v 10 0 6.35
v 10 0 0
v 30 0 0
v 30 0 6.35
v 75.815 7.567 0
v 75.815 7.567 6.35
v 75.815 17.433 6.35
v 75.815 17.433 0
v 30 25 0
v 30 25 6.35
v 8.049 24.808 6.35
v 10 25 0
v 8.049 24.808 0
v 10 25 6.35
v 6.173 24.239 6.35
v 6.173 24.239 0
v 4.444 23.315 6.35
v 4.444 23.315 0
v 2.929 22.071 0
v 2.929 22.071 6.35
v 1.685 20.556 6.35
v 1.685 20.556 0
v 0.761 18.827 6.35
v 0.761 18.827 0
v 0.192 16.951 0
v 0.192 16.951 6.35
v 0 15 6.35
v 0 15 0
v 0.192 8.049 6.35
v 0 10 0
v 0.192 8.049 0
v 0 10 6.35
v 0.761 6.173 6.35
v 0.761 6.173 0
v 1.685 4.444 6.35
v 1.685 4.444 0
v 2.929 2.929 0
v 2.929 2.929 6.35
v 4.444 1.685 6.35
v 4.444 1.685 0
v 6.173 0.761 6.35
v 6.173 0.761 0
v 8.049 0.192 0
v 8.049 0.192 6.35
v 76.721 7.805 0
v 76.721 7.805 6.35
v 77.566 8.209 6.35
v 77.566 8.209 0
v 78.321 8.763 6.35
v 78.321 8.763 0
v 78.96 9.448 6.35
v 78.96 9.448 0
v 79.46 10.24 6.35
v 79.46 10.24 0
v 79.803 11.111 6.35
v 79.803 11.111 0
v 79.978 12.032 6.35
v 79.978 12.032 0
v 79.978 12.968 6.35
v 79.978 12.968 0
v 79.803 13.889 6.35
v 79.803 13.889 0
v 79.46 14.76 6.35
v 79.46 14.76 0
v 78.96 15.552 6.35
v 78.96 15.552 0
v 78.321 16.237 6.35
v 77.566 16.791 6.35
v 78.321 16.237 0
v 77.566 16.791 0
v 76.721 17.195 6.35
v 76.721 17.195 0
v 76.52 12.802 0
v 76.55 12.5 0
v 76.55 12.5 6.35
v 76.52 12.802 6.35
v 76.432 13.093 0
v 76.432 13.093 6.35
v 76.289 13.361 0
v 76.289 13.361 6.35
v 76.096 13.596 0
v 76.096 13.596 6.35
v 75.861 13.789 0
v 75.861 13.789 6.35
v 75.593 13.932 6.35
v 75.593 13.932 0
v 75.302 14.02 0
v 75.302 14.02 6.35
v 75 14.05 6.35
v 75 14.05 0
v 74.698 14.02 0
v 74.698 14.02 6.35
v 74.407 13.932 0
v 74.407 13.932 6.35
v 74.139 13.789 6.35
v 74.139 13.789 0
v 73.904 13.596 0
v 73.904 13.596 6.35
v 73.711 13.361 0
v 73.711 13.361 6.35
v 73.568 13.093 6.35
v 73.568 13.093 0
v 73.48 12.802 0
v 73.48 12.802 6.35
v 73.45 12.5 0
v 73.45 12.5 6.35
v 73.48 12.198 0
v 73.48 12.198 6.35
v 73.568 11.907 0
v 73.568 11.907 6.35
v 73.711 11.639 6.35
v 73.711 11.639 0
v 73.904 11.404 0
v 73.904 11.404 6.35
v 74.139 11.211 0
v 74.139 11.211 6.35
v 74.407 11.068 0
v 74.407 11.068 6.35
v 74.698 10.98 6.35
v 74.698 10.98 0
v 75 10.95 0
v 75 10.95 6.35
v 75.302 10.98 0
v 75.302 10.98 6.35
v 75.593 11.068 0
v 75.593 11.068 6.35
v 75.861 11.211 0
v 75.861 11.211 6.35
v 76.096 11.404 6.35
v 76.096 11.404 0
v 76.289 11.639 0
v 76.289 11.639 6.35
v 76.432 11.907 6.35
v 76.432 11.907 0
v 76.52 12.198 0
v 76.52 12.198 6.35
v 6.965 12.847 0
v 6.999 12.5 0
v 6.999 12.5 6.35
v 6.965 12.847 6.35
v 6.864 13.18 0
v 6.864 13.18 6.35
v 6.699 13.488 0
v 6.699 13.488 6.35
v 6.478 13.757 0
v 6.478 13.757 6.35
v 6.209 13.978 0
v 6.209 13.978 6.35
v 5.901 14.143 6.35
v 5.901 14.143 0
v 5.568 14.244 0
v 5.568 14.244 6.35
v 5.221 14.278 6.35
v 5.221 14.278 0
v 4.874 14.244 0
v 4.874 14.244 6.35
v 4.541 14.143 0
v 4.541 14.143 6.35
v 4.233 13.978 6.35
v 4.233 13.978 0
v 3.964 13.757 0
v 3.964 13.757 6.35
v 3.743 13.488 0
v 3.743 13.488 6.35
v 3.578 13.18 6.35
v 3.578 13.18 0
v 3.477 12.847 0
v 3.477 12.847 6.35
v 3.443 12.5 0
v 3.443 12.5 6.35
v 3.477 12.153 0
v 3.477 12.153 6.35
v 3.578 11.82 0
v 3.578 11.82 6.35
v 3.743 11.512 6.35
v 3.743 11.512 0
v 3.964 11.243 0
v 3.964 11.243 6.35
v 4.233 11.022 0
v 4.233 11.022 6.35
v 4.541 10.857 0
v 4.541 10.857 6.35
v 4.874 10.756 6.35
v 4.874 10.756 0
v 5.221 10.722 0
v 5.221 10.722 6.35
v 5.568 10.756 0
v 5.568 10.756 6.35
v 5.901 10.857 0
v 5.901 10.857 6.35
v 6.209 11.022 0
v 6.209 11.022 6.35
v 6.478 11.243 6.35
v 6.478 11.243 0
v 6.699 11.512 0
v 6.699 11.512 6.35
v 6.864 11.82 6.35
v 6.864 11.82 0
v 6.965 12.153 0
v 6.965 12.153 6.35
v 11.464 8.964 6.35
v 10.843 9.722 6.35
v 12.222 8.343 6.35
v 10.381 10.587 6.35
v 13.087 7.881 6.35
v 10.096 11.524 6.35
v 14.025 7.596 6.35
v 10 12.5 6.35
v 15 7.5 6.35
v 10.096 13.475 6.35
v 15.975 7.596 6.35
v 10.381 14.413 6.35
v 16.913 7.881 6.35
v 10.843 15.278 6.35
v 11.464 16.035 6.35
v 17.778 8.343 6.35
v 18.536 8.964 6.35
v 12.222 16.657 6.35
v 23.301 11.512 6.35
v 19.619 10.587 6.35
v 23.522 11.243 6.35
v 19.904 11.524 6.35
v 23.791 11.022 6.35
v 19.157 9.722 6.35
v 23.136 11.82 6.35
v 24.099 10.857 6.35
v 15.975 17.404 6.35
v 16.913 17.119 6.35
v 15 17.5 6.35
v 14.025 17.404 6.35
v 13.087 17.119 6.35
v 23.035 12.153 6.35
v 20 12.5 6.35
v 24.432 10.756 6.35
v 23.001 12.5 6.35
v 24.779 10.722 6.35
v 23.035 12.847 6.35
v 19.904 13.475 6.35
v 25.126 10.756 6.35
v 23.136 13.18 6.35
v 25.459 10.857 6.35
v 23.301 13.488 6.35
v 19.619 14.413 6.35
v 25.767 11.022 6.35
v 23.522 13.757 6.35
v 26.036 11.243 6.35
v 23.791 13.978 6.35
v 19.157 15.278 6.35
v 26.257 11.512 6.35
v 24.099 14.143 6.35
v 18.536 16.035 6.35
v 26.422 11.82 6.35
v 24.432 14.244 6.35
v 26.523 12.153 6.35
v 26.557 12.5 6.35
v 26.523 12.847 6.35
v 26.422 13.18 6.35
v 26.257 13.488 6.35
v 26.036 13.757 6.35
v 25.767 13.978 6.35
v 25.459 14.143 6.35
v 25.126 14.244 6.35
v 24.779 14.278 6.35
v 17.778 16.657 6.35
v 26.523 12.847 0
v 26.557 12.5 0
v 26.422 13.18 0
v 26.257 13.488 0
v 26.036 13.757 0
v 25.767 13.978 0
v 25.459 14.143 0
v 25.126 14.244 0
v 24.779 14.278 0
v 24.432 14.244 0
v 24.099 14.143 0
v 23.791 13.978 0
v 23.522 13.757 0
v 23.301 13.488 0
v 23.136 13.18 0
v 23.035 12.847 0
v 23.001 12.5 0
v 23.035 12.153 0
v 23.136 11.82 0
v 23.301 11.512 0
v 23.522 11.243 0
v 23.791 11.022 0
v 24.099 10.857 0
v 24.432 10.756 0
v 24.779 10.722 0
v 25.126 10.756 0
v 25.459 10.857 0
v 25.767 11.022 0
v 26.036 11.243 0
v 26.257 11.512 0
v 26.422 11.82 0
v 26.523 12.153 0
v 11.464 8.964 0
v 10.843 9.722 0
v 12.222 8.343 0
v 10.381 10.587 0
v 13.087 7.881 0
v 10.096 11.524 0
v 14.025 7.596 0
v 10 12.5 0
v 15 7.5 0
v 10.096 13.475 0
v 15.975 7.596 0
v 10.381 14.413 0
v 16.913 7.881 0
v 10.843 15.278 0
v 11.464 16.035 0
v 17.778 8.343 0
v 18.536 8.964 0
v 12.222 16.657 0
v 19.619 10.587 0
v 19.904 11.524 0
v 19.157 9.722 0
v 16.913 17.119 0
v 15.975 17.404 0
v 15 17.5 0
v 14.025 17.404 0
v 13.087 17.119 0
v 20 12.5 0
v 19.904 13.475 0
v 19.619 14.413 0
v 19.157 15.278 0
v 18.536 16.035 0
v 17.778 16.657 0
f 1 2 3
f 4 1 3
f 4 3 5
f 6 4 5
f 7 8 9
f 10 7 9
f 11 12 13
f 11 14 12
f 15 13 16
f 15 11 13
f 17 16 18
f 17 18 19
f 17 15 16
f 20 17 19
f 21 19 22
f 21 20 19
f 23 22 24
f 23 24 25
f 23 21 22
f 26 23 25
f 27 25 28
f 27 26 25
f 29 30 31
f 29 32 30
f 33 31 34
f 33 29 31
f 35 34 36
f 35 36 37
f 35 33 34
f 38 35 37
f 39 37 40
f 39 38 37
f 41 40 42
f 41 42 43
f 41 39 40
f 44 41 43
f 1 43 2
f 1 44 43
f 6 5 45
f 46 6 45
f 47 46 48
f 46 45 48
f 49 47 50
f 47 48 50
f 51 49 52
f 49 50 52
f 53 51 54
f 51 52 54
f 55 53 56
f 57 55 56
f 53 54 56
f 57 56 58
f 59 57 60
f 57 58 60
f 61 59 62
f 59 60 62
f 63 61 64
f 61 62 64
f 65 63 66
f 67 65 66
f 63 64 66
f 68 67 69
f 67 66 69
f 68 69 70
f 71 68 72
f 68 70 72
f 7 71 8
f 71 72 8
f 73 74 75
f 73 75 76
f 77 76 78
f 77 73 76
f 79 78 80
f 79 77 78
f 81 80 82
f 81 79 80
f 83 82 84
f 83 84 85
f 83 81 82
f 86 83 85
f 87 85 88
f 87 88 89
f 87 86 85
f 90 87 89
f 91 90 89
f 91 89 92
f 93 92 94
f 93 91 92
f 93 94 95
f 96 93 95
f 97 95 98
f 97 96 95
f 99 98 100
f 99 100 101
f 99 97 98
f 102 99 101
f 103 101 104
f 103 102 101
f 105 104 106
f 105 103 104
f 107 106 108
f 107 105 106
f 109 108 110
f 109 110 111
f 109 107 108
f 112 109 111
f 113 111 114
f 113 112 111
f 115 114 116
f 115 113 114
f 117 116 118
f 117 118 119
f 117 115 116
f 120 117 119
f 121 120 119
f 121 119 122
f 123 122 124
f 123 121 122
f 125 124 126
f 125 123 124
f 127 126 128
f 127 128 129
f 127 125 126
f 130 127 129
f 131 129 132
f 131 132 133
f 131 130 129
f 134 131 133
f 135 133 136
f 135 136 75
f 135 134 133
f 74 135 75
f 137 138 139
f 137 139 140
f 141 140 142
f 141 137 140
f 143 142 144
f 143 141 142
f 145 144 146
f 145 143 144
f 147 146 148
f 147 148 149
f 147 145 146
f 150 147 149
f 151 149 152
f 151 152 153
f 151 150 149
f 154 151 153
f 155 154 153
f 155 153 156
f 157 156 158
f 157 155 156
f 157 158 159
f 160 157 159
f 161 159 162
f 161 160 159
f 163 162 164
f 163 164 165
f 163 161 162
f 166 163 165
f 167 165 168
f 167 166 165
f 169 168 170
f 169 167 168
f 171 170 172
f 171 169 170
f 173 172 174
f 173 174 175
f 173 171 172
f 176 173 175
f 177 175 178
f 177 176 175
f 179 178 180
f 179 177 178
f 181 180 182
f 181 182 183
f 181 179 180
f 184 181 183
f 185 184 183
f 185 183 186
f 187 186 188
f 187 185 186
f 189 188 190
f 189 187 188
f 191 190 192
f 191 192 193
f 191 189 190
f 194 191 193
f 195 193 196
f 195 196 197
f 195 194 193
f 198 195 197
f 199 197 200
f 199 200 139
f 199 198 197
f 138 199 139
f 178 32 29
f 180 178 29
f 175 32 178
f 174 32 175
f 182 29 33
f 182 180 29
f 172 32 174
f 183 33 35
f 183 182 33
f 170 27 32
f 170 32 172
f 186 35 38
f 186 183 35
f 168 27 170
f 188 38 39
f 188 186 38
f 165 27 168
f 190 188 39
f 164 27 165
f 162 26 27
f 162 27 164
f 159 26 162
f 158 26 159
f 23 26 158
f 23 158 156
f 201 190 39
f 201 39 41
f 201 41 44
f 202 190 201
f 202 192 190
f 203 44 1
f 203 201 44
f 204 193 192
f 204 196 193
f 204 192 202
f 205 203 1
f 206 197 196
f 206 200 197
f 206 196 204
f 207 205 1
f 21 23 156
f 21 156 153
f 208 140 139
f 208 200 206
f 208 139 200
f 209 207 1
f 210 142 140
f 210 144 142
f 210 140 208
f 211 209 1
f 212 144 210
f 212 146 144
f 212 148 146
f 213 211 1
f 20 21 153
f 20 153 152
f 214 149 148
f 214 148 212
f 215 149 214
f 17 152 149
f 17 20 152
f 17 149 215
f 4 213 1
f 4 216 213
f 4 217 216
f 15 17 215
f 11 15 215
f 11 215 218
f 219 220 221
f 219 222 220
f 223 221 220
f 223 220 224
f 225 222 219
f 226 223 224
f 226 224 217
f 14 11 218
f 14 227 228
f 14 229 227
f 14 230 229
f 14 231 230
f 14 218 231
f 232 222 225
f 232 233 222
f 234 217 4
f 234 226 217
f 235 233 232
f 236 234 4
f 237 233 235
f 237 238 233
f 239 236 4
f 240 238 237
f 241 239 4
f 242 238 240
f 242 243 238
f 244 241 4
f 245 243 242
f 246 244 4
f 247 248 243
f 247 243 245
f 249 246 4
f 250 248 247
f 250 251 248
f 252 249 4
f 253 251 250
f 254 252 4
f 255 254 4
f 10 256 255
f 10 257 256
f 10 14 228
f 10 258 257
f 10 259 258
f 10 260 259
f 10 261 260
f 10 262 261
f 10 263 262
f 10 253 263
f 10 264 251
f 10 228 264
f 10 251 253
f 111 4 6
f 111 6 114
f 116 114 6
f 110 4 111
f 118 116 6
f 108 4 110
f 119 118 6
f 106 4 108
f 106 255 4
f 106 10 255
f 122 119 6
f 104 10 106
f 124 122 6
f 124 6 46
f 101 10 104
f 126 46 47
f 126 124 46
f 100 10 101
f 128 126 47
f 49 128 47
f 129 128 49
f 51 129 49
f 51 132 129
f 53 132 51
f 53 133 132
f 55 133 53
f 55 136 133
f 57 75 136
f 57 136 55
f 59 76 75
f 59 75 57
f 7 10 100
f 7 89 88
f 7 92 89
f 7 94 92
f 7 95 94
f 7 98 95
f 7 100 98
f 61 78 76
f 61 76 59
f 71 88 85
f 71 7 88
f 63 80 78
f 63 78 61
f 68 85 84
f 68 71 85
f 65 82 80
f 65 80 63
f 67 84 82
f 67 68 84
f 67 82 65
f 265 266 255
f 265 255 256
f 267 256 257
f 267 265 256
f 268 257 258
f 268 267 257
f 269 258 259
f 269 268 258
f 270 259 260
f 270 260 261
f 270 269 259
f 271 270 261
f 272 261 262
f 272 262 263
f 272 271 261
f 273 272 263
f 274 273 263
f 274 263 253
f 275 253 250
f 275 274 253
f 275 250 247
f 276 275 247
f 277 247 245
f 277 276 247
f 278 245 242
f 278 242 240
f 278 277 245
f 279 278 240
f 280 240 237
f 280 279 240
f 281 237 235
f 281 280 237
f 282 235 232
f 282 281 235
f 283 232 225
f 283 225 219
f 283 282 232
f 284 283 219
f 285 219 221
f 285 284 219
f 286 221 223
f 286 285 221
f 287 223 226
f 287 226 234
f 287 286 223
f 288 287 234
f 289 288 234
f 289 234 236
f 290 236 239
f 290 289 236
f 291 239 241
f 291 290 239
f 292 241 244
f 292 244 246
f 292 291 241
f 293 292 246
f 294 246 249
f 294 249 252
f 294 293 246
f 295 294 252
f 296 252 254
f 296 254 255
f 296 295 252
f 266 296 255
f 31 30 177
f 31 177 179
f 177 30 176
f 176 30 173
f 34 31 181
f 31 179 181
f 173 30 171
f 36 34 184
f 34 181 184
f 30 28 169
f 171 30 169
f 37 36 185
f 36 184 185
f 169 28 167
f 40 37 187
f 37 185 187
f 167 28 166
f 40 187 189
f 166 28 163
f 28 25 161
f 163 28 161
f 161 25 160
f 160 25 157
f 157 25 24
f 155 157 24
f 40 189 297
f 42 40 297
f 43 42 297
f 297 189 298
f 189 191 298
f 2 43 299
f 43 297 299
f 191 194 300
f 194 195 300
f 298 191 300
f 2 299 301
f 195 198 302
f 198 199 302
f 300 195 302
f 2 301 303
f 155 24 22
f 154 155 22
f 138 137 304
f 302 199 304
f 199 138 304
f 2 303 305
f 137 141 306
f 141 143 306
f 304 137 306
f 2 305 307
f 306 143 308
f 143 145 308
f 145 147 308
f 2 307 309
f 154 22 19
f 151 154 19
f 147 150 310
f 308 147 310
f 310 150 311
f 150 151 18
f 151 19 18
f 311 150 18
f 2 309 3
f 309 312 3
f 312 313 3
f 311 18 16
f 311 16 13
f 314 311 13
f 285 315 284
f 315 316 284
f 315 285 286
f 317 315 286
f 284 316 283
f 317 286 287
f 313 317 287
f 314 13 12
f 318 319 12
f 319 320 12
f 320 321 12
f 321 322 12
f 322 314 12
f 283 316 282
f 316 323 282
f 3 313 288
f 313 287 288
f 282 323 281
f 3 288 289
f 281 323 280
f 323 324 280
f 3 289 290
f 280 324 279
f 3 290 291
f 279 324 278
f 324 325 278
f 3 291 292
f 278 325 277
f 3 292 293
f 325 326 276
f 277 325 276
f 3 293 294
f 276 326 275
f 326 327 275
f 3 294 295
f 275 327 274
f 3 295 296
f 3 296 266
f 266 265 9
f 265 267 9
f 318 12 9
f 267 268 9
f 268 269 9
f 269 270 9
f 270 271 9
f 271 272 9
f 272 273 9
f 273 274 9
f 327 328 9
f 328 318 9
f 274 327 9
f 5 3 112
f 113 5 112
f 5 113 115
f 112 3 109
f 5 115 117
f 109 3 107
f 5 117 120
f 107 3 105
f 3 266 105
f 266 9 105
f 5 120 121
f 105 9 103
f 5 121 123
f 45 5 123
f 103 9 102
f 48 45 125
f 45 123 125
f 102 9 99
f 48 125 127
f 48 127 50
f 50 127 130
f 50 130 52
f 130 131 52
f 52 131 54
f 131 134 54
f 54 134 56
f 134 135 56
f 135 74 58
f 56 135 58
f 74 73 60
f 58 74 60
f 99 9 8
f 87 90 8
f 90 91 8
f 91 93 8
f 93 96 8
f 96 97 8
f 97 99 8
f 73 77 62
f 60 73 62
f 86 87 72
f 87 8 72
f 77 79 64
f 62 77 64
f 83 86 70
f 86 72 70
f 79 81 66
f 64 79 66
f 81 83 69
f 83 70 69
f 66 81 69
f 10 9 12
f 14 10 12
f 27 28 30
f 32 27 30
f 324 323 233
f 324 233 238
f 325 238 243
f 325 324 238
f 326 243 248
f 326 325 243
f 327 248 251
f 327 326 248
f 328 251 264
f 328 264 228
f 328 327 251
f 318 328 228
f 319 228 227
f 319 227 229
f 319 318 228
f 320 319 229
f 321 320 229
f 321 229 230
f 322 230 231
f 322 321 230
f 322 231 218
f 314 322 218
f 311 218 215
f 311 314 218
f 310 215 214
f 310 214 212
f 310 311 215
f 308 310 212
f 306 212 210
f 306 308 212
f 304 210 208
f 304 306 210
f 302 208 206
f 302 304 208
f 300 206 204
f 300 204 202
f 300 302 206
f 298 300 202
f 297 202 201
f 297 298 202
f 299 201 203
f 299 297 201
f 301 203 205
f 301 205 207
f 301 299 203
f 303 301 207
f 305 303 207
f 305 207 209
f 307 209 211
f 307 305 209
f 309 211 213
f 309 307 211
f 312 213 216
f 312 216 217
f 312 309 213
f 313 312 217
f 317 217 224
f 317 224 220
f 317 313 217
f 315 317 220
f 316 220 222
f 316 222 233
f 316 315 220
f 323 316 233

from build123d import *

# Parameters (mm, degrees)
SKETCH1_R           = 1.778
SKETCH1_R_2         = 1.55
SKETCH1_R_3         = 5
BOSS_EXTRUDE1_DEPTH = 6.35
FILLET1_R           = 10


with BuildPart() as part:
    # Sketch1 → Boss-Extrude1 (new body)
    with BuildSketch(Plane.XY):
        with BuildLine():
            Line((75.814774676, 17.433113678), (30, 25))
            Line((30, 25), (0, 25))
            Line((0, 25), (0, 0))
            Line((0, 0), (30, 0))
            Line((30, 0), (75.814763379, 7.566776682))
            ThreePointArc((75.814763379, 7.566776682), (80, 12.499940388), (75.814774676, 17.433113678))
        make_face()
        with Locations((24.779, 12.499946113)):
            Circle(SKETCH1_R, mode=Mode.SUBTRACT)
        with Locations((5.221, 12.499946113)):
            Circle(SKETCH1_R, mode=Mode.SUBTRACT)
        with Locations((75, 12.499946113)):
            Circle(SKETCH1_R_2, mode=Mode.SUBTRACT)
        with Locations((15, 12.499946113)):
            Circle(SKETCH1_R_3, mode=Mode.SUBTRACT)
    extrude(amount=BOSS_EXTRUDE1_DEPTH)

    # Fillet1
    fillet1_edges = [part.edges().sort_by_distance(p)[0] for p in [
        (0, 0, 3.175),
        (0, 25, 3.175),
    ]]
    fillet(fillet1_edges, radius=FILLET1_R)


solid = part.part
